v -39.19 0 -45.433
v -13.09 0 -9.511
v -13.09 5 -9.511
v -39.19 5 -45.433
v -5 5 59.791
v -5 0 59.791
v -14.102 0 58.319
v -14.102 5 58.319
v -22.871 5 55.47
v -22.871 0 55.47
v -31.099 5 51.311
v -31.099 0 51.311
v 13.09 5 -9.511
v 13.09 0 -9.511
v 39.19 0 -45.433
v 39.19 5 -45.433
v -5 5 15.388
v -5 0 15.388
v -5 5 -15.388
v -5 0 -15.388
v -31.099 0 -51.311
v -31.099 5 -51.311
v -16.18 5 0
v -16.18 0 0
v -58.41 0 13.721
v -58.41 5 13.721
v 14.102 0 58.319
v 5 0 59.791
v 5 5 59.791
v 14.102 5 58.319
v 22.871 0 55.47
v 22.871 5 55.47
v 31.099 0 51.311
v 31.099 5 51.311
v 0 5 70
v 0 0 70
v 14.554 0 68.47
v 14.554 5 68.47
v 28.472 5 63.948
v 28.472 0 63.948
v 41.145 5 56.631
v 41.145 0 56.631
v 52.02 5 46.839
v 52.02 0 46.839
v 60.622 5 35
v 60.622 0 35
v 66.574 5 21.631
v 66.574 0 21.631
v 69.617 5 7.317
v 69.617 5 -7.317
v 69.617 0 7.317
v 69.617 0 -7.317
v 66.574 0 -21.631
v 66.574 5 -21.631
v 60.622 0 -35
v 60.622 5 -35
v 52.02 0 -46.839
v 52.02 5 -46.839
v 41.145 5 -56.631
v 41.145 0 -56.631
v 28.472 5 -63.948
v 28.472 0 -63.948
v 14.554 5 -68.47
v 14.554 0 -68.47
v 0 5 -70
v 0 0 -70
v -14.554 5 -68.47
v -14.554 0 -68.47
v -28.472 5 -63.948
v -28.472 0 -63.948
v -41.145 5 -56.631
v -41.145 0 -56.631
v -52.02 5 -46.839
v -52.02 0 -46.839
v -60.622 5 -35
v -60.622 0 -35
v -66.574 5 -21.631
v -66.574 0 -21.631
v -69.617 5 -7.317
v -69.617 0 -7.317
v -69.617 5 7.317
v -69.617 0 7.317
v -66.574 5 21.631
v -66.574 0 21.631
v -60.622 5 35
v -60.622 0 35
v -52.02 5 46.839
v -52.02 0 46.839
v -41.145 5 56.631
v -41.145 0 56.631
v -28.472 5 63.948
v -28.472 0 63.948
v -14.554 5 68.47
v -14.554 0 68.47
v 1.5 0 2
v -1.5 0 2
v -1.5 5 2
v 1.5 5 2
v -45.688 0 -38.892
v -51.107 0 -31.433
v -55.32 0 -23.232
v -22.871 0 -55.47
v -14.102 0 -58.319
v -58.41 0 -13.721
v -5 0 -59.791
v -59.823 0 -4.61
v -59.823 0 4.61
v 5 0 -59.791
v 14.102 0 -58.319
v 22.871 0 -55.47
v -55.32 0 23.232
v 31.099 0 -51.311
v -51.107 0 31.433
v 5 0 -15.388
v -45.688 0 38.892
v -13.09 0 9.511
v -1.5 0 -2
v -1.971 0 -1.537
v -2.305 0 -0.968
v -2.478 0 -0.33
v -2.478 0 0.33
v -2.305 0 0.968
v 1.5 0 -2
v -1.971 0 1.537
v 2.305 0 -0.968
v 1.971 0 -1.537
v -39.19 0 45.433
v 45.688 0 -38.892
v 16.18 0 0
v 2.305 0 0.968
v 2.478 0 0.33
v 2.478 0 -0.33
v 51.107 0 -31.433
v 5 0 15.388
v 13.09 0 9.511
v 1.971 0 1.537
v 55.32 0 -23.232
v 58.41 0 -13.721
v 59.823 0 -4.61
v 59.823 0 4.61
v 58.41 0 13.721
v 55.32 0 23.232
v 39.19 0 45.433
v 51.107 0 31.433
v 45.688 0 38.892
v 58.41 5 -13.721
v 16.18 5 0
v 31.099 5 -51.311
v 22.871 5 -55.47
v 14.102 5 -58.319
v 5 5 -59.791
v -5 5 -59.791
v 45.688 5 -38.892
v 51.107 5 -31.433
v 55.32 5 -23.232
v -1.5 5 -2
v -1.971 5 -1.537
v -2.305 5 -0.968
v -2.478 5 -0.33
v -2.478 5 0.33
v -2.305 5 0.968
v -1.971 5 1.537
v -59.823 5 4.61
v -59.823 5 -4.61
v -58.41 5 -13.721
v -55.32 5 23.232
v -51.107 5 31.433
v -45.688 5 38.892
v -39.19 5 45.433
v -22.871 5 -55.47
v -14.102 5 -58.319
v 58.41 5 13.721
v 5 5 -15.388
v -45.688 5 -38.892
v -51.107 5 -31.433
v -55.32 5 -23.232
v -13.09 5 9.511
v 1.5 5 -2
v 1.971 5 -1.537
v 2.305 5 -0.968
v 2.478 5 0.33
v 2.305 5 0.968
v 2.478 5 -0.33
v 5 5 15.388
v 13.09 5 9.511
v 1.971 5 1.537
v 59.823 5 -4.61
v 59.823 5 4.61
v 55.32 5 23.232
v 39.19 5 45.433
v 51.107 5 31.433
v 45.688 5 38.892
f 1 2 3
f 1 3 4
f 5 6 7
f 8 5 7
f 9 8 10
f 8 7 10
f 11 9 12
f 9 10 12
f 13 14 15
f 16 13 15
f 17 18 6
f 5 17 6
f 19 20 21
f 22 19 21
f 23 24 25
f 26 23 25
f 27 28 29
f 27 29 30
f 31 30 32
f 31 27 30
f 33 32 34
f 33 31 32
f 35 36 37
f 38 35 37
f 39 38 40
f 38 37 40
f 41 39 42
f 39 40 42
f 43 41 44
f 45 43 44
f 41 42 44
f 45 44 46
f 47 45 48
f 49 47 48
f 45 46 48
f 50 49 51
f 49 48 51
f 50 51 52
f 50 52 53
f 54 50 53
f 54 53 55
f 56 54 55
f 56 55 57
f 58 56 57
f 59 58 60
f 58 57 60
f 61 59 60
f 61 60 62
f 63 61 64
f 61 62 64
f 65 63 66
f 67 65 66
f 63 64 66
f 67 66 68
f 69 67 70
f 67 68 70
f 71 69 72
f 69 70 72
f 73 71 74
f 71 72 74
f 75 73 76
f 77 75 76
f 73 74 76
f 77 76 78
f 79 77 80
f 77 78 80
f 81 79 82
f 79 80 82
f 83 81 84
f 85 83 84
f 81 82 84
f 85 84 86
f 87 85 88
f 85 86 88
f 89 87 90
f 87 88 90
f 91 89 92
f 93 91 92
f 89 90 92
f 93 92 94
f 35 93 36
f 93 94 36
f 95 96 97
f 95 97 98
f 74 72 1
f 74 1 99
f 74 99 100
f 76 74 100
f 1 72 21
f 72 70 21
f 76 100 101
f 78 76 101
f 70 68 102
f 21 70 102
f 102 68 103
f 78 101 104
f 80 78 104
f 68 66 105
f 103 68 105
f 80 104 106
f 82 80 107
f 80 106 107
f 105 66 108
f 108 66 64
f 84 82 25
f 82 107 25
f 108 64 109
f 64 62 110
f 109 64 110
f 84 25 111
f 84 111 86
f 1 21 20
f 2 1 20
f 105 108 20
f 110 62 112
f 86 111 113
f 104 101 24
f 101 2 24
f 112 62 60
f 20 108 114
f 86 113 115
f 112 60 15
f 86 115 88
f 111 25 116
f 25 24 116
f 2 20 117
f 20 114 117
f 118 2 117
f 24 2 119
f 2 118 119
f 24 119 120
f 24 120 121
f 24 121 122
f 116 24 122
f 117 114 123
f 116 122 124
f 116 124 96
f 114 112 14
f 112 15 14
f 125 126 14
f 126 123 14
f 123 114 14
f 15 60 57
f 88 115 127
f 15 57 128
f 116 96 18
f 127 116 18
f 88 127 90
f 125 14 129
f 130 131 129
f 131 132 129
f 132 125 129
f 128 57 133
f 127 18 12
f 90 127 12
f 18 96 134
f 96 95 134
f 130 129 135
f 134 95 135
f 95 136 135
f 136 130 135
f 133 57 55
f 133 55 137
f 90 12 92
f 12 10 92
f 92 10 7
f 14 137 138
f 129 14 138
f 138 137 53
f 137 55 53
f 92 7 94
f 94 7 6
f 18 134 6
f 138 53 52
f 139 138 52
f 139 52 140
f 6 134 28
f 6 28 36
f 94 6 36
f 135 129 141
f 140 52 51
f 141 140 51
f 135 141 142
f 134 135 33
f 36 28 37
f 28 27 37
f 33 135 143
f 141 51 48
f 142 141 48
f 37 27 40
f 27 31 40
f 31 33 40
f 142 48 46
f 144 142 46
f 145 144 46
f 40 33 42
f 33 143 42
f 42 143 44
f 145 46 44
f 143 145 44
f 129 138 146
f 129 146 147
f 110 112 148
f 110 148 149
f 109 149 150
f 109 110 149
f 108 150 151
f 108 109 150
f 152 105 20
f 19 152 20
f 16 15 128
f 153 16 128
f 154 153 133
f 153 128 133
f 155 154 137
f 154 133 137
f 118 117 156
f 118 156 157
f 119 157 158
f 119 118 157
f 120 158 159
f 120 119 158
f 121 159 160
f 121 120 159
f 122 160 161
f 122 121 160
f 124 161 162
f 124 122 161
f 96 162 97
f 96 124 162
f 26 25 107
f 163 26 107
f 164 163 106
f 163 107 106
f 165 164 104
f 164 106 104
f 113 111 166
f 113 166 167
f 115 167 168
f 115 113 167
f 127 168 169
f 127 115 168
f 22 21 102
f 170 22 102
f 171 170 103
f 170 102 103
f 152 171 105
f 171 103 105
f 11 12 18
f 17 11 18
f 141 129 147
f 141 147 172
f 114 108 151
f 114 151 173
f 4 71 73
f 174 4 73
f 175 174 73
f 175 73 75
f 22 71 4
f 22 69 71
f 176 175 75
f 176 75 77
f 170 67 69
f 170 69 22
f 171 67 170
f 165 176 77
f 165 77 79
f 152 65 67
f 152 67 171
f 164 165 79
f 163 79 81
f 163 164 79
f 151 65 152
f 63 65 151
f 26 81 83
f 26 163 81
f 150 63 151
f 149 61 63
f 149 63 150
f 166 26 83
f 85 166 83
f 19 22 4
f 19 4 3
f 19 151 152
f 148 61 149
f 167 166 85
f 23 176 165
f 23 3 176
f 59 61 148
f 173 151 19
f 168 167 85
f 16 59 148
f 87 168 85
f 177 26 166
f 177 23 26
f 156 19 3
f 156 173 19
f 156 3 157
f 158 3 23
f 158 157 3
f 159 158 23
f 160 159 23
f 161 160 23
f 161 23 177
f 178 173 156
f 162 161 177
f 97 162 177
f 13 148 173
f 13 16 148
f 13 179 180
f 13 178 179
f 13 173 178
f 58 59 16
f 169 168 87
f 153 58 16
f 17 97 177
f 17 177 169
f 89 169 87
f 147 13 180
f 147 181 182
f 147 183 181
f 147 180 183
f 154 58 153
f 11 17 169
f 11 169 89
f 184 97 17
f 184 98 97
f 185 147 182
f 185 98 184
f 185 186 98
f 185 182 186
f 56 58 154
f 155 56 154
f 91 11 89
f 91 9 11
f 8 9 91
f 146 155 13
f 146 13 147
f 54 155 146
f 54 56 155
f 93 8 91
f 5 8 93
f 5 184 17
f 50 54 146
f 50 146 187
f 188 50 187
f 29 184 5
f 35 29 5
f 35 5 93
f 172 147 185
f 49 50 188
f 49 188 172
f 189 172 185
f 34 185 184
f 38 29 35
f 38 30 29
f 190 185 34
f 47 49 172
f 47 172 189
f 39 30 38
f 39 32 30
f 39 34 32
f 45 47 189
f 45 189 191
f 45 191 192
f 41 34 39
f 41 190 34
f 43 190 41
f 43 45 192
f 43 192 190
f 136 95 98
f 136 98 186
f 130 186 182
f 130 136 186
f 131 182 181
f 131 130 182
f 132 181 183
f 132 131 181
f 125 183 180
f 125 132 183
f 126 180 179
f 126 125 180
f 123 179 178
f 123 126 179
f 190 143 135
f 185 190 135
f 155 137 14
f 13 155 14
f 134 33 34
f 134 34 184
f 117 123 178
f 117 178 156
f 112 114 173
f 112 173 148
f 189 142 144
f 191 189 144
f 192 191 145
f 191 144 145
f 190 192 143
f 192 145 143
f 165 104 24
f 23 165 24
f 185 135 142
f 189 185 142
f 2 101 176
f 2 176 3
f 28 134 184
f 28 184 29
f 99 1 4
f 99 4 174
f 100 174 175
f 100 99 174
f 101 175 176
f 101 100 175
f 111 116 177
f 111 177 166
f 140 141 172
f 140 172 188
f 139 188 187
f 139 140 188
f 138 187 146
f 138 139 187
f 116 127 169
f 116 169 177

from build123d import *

# Parameters (mm, degrees)
SKETCH1_R           = 70
BOSS_EXTRUDE1_DEPTH = 5


with BuildPart() as part:
    # Sketch1 → Boss-Extrude1 (new body)
    with BuildSketch(Plane(origin=(0, 0, 0), x_dir=(1, 0, 0), z_dir=(0, 1, 0))):
        with Locations(Location((0, 0, 0), (0, 0, 270))):
            Circle(SKETCH1_R)
        with BuildLine():
            Line((55.319824044, 23.231811546), (13.090169944, 9.510565163))
            Line((13.090169944, 9.510565163), (39.189531511, 45.43325456))
            ThreePointArc((39.189531511, 45.43325456), (48.541019662, 35.267115138), (55.319824044, 23.231811546))
        make_face(mode=Mode.SUBTRACT)
        with BuildLine():
            Line((-5, 15.388417687), (-31.099361567, 51.311107083))
            ThreePointArc((-31.099361567, 51.311107083), (-18.541019662, 57.063390978), (-5, 59.791303716))
            Line((-5, 59.791303716), (-5, 15.388417687))
        make_face(mode=Mode.SUBTRACT)
        with BuildLine():
            Line((5, 15.388417686), (31.099361567, 51.311107083))
            ThreePointArc((31.099361567, 51.311107083), (18.541019662, 57.063390978), (5, 59.791303716))
            Line((5, 59.791303716), (5, 15.388417686))
        make_face(mode=Mode.SUBTRACT)
        with BuildLine():
            Line((58.409993988, 13.721246383), (16.180339887, 0))
            Line((16.180339887, 0), (58.409993988, -13.721246382))
            ThreePointArc((58.409993988, -13.721246382), (60, 0), (58.409993988, 13.721246383))
        make_face(mode=Mode.SUBTRACT)
        with BuildLine():
            Line((39.189531511, -45.43325456), (13.090169944, -9.510565163))
            Line((13.090169944, -9.510565163), (55.319824045, -23.231811545))
            ThreePointArc((55.319824045, -23.231811545), (48.541019663, -35.267115137), (39.189531511, -45.43325456))
        make_face(mode=Mode.SUBTRACT)
        with BuildLine():
            Line((31.099361568, -51.311107083), (5, -15.388417685))
            Line((5, -15.388417685), (5, -59.791303716))
            ThreePointArc((5, -59.791303716), (18.541019663, -57.063390978), (31.099361568, -51.311107083))
        make_face(mode=Mode.SUBTRACT)
        with BuildLine():
            Line((-55.319824044, 23.231811546), (-13.090169944, 9.510565163))
            Line((-13.090169944, 9.510565163), (-39.189531511, 45.43325456))
            ThreePointArc((-39.189531511, 45.43325456), (-48.541019662, 35.267115138), (-55.319824044, 23.231811546))
        make_face(mode=Mode.SUBTRACT)
        with BuildLine():
            Line((-58.409993988, 13.721246383), (-16.180339888, 0))
            Line((-16.180339888, 0), (-58.409993988, -13.721246382))
            ThreePointArc((-58.409993988, -13.721246382), (-60, 0), (-58.409993988, 13.721246383))
        make_face(mode=Mode.SUBTRACT)
        with BuildLine():
            Line((-39.189531511, -45.43325456), (-13.090169944, -9.510565163))
            Line((-13.090169944, -9.510565163), (-55.319824045, -23.231811545))
            ThreePointArc((-55.319824045, -23.231811545), (-48.541019663, -35.267115137), (-39.189531511, -45.43325456))
        make_face(mode=Mode.SUBTRACT)
        with BuildLine():
            Line((-31.099361568, -51.311107083), (-5, -15.388417686))
            Line((-5, -15.388417686), (-5, -59.791303715))
            ThreePointArc((-5, -59.791303715), (-18.541019663, -57.063390978), (-31.099361568, -51.311107083))
        make_face(mode=Mode.SUBTRACT)
        with BuildLine():
            Line((-1.5, -2), (1.5, -2))
            ThreePointArc((1.5, -2), (2.5, 0), (1.5, 2))
            Line((1.5, 2), (-1.5, 2))
            ThreePointArc((-1.5, 2), (-2.5, 0), (-1.5, -2))
        make_face(mode=Mode.SUBTRACT)
    extrude(amount=BOSS_EXTRUDE1_DEPTH)


solid = part.part
